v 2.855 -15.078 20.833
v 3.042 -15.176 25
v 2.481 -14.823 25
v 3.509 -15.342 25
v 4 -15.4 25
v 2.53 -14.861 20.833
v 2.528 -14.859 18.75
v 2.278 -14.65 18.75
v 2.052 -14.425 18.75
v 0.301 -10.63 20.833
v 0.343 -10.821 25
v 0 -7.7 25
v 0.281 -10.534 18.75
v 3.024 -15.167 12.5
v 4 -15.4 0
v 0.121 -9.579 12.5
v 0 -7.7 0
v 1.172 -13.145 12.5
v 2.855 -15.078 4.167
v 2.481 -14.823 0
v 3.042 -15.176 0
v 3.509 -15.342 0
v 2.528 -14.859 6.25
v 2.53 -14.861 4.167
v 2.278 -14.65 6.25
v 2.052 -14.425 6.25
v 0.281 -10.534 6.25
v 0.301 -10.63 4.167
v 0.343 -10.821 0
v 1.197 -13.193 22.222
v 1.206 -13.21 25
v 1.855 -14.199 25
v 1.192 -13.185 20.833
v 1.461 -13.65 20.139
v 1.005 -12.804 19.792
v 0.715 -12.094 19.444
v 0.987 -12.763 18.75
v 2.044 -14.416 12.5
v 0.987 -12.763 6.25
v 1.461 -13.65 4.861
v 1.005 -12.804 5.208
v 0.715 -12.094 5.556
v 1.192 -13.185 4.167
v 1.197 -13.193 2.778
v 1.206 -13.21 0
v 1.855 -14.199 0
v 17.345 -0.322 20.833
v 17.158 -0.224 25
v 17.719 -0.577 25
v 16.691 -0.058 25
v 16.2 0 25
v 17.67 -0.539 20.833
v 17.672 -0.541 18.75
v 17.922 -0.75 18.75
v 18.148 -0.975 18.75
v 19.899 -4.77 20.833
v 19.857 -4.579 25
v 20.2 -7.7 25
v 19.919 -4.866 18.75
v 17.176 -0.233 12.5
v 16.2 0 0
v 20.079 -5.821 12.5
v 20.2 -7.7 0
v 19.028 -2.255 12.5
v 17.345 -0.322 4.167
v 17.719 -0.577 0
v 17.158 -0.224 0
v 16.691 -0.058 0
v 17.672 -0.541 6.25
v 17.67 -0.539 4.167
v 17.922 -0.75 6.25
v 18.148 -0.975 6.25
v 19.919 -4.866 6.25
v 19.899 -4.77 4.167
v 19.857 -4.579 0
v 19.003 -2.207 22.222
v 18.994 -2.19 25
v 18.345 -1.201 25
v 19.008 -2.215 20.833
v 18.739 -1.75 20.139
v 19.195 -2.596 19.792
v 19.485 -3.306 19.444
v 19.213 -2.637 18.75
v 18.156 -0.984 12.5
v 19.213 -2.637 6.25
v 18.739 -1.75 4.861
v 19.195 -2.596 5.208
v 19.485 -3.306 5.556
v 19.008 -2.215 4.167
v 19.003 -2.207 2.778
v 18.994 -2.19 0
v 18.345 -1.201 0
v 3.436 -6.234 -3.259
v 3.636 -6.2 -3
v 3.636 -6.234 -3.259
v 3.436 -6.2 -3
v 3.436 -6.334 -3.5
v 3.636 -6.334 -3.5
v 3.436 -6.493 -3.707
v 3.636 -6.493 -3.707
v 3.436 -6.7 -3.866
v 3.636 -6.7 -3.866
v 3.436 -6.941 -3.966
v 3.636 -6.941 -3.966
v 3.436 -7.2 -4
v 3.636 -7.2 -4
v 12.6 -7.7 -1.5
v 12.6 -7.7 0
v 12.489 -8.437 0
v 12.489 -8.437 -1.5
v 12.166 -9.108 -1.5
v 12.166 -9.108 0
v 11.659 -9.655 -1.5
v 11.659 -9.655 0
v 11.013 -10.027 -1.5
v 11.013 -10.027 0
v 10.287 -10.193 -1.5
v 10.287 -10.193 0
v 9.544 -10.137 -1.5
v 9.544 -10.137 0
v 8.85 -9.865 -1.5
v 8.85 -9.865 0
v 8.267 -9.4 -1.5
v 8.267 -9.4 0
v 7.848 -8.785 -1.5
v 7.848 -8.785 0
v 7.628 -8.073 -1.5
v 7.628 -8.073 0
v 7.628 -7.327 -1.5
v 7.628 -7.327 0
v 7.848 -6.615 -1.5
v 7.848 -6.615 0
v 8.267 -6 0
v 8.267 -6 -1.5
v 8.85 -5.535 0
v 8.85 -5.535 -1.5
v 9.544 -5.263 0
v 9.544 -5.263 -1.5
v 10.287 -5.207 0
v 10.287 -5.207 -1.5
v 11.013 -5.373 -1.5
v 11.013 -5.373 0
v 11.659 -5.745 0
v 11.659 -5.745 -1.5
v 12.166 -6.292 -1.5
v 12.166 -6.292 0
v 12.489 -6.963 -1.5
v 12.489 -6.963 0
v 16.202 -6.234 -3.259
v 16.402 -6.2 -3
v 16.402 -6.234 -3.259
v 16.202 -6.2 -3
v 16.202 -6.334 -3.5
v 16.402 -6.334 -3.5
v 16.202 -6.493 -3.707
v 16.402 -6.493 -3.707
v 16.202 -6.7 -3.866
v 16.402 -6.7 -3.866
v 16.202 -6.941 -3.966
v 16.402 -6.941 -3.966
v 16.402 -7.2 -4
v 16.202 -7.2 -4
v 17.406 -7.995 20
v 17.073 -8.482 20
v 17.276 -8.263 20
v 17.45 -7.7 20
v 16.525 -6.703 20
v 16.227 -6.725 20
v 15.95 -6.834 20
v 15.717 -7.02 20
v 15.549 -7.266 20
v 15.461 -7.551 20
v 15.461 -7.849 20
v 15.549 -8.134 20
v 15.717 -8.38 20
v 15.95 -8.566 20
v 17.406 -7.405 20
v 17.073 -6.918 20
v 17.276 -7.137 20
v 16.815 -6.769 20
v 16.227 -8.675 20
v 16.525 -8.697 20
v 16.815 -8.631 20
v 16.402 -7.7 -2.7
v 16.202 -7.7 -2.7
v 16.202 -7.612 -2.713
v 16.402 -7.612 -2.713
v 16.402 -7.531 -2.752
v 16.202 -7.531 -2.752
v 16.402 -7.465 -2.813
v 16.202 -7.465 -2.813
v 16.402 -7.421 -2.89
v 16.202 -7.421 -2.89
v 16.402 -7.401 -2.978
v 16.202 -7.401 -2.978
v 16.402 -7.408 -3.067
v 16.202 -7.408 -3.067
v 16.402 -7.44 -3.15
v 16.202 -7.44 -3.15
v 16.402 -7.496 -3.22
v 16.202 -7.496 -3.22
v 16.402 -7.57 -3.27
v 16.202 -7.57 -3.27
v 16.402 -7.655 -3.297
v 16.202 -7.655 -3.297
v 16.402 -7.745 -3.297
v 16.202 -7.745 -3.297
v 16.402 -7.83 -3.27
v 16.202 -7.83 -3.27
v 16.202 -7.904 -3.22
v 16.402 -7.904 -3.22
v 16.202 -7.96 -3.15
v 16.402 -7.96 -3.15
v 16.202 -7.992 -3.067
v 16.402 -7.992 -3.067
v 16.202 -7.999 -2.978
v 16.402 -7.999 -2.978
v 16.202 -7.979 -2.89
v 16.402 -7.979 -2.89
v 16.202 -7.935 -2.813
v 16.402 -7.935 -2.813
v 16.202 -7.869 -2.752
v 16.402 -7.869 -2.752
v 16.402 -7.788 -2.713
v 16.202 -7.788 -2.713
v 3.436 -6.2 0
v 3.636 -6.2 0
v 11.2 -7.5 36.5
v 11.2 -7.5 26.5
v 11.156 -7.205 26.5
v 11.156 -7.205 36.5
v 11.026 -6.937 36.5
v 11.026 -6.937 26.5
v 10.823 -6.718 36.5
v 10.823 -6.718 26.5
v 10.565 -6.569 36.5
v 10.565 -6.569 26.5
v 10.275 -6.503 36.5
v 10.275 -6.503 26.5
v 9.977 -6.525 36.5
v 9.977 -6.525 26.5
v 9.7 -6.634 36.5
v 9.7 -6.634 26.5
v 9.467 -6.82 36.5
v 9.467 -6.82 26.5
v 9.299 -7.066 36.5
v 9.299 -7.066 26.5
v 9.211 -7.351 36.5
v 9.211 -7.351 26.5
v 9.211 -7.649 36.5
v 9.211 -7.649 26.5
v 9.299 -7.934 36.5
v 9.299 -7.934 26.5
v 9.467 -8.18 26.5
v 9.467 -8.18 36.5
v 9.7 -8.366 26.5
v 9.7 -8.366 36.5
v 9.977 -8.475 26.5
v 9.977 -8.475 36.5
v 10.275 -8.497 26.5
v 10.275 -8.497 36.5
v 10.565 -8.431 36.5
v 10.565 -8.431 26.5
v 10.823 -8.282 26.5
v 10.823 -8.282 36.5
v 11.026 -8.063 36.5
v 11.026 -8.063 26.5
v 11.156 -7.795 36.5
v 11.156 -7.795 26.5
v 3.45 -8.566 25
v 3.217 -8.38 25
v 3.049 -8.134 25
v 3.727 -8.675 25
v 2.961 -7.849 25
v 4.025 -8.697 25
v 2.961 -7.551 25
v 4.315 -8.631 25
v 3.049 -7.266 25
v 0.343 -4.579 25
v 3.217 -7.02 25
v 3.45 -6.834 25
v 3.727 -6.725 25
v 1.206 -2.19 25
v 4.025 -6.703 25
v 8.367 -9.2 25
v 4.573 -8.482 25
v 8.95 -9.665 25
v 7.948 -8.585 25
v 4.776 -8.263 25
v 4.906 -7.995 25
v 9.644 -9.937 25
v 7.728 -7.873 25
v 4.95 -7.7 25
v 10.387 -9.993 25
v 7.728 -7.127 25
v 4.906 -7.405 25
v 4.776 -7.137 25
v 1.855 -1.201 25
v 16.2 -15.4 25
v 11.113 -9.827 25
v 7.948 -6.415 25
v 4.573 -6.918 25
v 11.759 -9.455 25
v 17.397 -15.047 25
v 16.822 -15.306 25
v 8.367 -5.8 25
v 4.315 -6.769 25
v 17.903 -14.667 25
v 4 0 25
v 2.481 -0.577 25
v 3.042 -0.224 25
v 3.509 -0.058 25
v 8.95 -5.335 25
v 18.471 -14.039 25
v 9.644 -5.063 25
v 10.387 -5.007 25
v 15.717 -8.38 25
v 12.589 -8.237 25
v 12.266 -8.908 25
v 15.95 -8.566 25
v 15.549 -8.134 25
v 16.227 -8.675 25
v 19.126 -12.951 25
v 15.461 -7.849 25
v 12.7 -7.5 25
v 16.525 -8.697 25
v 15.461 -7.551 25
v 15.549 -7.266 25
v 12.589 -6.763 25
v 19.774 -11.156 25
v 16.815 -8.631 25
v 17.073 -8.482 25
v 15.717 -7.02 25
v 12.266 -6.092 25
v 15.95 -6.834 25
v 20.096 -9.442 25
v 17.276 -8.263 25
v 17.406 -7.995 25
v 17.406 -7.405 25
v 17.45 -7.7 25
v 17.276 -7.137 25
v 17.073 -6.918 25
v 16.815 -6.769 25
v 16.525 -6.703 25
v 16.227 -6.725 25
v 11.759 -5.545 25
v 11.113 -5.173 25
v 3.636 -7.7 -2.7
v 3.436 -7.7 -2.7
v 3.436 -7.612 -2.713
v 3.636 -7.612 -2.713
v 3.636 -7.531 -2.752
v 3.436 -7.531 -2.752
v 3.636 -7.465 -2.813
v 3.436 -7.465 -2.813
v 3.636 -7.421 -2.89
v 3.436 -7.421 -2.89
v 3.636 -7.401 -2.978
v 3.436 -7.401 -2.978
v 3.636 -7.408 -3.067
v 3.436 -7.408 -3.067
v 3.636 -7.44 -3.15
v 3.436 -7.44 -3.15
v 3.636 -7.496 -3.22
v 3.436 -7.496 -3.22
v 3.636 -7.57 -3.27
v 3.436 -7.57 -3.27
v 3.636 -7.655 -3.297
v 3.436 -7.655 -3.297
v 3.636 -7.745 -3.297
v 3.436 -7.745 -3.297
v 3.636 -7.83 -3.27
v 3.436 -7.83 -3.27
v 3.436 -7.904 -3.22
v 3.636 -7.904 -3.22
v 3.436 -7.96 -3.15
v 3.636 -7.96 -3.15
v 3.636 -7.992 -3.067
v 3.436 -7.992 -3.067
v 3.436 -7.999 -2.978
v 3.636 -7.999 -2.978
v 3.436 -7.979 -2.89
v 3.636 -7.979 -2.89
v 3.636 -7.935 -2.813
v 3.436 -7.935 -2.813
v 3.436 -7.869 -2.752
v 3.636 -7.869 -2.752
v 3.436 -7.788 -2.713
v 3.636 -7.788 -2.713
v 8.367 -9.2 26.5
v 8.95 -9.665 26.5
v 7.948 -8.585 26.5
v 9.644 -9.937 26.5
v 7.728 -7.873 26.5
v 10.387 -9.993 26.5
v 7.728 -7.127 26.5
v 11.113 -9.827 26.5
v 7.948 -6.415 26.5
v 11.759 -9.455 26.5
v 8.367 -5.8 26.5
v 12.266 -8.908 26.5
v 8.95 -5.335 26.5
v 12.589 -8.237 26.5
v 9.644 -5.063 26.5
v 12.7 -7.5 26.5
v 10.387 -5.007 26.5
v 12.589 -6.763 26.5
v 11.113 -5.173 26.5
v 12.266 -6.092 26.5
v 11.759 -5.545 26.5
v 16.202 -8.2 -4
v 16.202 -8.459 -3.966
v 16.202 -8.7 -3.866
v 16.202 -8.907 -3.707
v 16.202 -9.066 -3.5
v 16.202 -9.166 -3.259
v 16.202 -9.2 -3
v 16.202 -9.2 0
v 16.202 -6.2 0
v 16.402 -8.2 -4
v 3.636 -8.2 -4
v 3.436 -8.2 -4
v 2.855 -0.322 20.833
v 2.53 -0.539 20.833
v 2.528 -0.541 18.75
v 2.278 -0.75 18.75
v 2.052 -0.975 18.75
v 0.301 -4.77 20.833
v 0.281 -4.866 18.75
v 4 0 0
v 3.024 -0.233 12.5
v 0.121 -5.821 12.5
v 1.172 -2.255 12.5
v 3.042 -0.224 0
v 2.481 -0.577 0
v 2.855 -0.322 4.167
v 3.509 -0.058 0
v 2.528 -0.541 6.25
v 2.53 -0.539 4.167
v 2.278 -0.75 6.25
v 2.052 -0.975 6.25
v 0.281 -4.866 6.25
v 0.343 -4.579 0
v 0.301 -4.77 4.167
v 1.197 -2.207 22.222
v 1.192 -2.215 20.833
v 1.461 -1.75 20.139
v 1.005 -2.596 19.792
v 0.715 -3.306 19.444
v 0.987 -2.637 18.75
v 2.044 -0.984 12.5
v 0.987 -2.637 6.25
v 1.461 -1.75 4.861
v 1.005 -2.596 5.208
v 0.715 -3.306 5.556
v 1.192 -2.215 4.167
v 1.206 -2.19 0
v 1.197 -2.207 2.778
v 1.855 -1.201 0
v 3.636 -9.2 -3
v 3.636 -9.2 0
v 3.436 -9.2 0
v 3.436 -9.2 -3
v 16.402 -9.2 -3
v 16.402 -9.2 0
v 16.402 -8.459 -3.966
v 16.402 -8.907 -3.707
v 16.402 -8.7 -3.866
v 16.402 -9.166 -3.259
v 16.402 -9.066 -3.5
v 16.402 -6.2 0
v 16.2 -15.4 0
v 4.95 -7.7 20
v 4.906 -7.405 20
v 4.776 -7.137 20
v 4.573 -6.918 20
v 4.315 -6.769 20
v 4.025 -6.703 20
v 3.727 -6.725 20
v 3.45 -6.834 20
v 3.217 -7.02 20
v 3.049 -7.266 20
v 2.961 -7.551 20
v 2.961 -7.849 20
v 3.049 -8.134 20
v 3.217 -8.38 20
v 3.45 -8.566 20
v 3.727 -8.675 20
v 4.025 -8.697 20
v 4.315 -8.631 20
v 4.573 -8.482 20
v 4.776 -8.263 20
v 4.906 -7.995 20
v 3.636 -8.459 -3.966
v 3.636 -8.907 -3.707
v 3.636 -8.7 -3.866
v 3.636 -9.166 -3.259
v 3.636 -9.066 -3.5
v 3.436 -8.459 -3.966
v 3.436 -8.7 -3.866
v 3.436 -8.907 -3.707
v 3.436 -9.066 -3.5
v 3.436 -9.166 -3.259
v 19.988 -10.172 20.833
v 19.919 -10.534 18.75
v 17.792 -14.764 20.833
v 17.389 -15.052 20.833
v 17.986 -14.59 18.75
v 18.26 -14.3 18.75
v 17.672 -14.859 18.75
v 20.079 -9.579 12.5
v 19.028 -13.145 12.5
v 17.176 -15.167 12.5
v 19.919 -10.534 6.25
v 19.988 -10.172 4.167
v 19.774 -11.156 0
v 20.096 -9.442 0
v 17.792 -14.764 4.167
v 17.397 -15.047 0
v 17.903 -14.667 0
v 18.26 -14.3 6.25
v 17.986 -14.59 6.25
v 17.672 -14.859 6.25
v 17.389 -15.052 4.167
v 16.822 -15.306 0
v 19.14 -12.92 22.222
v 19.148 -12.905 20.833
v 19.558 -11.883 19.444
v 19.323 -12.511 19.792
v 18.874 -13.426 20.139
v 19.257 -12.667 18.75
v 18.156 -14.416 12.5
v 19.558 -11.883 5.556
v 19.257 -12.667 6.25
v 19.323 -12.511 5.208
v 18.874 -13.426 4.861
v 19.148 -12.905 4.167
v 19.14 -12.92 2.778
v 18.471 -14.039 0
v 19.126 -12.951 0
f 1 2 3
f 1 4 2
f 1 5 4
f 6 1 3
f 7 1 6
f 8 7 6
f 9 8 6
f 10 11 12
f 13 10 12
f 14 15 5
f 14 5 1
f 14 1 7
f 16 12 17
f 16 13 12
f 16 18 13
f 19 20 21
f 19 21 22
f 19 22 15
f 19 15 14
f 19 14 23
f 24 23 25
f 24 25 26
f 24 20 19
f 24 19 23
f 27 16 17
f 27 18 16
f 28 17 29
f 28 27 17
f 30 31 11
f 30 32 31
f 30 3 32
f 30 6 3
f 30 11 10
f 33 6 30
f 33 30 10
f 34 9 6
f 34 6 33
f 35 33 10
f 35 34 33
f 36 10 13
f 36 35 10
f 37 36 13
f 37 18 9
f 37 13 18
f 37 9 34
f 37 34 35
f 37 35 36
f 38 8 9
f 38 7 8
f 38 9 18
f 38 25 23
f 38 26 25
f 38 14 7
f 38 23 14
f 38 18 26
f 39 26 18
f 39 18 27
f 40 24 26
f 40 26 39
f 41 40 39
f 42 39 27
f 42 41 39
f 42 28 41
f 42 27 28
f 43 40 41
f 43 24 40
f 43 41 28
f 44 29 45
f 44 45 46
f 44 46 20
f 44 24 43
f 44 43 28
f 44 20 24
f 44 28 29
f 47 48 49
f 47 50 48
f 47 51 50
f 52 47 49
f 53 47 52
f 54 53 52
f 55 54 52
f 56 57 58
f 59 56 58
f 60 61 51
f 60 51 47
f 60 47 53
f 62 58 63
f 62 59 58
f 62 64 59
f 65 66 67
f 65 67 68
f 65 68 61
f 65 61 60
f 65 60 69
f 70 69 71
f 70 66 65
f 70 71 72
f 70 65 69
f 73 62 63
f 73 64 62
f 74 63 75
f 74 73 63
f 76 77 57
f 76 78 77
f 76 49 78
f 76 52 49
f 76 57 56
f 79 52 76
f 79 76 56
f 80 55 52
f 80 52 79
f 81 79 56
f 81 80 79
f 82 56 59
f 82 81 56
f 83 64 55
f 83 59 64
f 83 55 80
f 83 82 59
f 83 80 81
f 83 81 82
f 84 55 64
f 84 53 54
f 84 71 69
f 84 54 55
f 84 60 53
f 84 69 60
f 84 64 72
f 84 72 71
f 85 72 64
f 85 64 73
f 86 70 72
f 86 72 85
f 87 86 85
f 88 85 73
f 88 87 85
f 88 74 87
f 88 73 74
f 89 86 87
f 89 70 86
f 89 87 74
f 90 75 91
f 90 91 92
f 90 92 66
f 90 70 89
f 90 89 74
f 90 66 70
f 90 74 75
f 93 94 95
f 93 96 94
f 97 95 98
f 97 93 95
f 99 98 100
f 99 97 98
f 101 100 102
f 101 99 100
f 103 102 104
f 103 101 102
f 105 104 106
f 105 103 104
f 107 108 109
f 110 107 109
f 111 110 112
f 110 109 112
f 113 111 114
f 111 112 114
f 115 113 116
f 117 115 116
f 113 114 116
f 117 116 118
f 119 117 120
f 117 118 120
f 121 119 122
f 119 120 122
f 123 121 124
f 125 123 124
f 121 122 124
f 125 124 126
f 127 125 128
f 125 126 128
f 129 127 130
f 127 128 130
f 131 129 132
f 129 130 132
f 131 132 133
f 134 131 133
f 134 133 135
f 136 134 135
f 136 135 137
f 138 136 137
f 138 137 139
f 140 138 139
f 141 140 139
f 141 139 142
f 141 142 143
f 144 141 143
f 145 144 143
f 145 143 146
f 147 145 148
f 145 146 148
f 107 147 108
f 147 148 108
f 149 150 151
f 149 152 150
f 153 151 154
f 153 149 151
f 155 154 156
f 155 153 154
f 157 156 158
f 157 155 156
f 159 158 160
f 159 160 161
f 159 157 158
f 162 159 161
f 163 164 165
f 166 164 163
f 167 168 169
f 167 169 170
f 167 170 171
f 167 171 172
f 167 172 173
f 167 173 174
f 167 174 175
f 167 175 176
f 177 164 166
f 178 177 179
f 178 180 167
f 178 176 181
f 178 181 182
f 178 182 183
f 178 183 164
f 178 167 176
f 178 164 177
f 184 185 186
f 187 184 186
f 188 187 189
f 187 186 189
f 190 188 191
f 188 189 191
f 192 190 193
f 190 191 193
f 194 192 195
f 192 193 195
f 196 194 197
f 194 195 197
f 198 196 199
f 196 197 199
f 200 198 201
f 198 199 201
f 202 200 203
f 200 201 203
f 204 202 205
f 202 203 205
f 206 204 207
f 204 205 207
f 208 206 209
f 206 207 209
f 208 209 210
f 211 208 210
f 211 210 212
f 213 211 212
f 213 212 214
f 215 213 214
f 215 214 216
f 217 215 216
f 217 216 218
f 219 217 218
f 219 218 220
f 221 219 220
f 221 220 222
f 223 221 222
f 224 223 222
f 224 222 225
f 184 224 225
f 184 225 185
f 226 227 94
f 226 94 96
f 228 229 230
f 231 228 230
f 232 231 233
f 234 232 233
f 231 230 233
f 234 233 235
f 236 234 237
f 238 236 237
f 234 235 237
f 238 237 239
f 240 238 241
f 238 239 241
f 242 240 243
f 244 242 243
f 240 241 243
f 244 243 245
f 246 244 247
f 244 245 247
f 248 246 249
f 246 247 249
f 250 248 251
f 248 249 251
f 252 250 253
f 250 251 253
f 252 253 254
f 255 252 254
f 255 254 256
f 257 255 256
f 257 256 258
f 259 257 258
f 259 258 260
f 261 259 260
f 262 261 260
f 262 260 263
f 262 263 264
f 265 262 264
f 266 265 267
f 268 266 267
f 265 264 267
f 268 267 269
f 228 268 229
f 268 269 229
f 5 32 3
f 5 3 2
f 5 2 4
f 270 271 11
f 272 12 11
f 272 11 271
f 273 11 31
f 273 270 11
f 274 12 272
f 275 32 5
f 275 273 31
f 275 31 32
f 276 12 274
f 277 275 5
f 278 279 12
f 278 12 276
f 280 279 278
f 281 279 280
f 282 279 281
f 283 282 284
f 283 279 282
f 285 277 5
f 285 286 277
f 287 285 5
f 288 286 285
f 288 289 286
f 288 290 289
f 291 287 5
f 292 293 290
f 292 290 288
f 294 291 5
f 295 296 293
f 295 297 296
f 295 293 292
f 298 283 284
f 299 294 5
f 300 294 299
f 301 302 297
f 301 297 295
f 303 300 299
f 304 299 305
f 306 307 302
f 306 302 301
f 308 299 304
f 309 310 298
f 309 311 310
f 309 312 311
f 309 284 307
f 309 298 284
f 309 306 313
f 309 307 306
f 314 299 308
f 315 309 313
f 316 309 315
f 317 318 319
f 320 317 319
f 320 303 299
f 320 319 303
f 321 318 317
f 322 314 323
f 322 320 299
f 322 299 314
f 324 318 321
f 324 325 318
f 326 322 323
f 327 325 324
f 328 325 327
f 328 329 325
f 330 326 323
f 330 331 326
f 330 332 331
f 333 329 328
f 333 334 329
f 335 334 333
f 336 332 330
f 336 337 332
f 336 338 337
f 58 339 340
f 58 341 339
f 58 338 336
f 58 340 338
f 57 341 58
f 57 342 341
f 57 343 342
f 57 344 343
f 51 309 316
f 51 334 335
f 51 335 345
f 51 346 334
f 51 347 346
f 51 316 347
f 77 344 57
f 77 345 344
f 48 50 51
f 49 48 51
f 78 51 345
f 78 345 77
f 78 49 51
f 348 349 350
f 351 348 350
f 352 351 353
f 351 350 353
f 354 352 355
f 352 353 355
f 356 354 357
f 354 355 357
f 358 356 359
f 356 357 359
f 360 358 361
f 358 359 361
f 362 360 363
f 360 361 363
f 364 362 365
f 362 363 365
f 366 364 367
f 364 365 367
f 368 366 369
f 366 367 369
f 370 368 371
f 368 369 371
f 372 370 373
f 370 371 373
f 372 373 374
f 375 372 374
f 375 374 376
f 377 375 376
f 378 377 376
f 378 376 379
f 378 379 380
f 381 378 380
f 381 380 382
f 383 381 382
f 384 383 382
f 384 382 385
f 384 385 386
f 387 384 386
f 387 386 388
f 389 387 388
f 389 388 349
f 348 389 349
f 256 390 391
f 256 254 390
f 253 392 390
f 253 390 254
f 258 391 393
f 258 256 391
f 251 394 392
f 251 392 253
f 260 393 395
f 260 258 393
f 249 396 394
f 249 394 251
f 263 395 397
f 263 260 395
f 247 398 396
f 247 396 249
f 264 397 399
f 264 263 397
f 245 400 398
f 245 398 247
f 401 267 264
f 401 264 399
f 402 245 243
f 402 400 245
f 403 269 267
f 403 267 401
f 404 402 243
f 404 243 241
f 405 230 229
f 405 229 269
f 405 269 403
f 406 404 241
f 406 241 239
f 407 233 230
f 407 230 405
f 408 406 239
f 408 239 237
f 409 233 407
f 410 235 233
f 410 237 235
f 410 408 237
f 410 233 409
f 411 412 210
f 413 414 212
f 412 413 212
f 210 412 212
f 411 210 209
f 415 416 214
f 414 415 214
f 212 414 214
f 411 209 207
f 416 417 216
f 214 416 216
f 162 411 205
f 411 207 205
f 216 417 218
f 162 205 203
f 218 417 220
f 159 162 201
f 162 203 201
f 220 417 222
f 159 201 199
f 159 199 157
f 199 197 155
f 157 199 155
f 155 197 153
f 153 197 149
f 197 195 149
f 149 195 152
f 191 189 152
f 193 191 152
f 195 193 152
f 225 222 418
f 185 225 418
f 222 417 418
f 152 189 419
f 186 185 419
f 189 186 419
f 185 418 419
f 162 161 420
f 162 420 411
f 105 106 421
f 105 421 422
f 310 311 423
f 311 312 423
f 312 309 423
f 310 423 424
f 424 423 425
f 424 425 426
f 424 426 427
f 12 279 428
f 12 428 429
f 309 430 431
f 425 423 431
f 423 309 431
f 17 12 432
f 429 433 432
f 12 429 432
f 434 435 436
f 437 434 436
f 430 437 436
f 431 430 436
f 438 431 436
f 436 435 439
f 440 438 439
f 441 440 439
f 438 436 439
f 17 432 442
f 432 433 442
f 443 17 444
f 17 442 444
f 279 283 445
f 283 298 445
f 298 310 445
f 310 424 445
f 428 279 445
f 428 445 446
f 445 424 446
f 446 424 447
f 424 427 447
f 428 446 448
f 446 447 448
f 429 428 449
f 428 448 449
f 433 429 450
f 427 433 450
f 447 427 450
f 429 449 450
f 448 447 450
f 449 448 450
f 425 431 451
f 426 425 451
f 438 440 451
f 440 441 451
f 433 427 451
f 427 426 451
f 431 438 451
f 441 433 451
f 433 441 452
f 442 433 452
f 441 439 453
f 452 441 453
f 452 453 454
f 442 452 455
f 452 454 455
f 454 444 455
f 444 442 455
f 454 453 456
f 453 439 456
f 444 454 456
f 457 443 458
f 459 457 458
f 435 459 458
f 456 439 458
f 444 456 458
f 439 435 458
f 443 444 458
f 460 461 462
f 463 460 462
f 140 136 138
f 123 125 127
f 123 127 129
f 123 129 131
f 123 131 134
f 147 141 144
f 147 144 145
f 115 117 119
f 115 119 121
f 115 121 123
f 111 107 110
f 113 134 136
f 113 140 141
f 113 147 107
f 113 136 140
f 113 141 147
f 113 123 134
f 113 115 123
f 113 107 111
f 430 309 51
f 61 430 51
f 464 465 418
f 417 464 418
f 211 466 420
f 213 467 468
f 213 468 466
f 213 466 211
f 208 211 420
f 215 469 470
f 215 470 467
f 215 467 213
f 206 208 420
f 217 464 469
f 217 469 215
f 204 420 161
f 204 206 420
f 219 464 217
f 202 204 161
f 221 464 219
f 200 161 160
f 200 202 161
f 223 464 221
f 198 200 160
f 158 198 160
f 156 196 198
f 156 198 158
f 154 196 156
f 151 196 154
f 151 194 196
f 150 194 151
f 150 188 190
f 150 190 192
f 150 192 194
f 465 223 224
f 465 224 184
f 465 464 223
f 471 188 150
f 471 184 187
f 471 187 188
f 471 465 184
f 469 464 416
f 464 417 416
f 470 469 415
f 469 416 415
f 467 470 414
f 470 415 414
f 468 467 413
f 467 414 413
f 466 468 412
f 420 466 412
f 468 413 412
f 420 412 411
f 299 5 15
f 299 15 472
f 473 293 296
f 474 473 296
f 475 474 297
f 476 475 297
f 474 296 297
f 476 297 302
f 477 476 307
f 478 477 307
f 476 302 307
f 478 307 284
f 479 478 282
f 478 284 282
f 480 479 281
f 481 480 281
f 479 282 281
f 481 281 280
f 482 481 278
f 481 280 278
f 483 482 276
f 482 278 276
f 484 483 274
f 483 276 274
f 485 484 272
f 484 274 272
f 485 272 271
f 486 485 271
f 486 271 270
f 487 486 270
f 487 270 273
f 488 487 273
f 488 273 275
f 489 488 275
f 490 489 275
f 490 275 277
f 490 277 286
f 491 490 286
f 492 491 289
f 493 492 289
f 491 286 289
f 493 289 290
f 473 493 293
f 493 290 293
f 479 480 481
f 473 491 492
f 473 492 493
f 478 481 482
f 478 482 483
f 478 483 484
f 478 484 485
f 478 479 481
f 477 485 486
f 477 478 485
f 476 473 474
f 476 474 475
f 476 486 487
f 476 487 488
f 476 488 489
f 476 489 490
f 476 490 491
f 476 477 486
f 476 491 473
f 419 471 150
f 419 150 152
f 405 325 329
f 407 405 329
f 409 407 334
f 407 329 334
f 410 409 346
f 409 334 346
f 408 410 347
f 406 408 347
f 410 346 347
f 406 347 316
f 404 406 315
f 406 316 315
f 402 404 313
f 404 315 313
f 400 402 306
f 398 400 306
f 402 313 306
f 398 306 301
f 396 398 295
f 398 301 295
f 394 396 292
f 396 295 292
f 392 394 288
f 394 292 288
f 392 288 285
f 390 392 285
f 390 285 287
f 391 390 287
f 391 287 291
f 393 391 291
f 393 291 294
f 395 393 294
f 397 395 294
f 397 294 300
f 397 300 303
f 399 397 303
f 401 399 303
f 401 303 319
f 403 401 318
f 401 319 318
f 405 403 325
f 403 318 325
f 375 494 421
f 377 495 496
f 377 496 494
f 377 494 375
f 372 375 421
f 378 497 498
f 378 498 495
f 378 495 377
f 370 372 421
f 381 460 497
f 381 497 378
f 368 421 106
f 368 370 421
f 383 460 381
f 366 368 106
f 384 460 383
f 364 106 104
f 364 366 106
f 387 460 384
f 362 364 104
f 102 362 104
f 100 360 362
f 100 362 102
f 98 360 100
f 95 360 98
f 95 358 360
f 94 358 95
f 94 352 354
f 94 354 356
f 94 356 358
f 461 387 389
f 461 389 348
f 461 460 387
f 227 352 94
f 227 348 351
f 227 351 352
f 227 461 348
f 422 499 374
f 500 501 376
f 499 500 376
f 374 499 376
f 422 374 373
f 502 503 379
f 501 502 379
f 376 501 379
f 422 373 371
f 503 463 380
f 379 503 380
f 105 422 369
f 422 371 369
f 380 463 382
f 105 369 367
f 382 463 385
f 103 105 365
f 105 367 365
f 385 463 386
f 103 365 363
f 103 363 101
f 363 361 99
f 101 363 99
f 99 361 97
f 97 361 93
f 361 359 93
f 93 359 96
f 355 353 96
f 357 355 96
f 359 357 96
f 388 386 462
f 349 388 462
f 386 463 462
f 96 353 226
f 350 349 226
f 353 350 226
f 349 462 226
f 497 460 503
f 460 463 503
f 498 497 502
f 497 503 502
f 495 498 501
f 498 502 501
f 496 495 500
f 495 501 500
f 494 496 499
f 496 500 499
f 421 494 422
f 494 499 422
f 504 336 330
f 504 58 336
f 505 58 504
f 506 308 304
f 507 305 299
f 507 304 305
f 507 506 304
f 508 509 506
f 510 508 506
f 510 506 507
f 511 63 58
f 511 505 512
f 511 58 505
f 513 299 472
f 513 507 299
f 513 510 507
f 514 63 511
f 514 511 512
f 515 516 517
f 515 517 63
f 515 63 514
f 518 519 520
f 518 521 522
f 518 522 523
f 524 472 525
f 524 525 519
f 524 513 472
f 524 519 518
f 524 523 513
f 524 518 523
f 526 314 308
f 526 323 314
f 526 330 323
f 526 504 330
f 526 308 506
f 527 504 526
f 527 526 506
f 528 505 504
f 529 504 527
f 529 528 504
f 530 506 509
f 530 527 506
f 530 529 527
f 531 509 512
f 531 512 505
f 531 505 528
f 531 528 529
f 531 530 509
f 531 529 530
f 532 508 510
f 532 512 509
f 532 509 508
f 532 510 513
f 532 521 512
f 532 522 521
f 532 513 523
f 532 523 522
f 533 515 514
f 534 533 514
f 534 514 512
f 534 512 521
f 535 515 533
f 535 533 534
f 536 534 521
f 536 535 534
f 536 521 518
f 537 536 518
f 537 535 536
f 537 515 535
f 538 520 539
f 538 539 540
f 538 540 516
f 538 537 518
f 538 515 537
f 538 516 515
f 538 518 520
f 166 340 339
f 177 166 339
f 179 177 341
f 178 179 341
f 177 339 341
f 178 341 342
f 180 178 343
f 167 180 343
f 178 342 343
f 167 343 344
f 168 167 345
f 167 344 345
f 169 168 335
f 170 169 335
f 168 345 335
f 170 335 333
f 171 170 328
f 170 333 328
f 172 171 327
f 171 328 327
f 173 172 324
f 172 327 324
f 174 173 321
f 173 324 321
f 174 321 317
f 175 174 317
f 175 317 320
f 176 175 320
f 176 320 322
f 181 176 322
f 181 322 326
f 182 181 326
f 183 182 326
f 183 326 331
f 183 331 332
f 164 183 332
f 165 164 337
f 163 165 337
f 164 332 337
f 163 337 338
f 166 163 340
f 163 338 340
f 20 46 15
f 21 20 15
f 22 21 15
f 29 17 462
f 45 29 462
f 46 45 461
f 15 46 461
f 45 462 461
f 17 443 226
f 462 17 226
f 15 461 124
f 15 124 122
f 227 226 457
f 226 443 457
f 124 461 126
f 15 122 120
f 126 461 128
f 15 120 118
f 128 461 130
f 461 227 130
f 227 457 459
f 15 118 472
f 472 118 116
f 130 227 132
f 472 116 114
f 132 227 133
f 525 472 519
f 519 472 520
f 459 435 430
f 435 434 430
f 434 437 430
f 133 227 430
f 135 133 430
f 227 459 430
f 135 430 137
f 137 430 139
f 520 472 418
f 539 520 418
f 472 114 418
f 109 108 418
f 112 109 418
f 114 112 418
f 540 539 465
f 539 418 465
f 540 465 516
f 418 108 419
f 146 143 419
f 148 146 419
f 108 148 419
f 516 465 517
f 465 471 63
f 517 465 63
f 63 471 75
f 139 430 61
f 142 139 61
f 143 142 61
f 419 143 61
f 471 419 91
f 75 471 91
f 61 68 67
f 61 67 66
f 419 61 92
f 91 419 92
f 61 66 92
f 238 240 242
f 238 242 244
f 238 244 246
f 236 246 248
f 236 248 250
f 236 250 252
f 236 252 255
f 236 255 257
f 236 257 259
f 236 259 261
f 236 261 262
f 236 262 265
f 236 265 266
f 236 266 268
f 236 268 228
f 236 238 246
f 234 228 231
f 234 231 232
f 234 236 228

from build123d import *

# Parameters (mm, degrees)
SKETCH_1_W          = 20.2
SKETCH_1_H          = 15.4
EXTRUDE_1_DEPTH     = 25
SKETCH_2_R          = 2.5
EXTRUDE_2_DEPTH     = 1.5
SKETCH_3_R          = 1
EXTRUDE_3_DEPTH     = 10
FILLET_2_SIZE       = 7.7
FILLET_2_SIZE_2     = 4
FILLET_3_SIZE       = 4
FILLET_3_SIZE_2     = 7.7
SKETCH_4_R          = 1
CUT_EXTRUDE_1_DEPTH = 5
SKETCH_5_R          = 2.5
EXTRUDE_4_DEPTH     = 1.5
SKETCH_6_W          = 0.2
SKETCH_6_H          = 3
EXTRUDE_5_DEPTH     = 4
FILLET_4_R          = 1
SKETCH_7_R          = 0.3
CUT_EXTRUDE_2_DEPTH = 44.016597153


with BuildPart() as part:
    # 草图1 → 凸台-拉伸1 (new body)
    with BuildSketch(Plane.XY):
        with Locations((10.1, -7.7)):
            Rectangle(SKETCH_1_W, SKETCH_1_H)
    extrude(amount=EXTRUDE_1_DEPTH)

    # 草图2 → 凸台-拉伸2 (add)
    with BuildSketch(Plane.XY.offset(25)):
        with Locations((10.2, -7.5)):
            Circle(SKETCH_2_R)
    extrude(amount=EXTRUDE_2_DEPTH)

    # 草图3 → 凸台-拉伸3 (add)
    with BuildSketch(Plane.XY.offset(26.5)):
        with Locations((10.2, -7.5)):
            Circle(SKETCH_3_R)
    extrude(amount=EXTRUDE_3_DEPTH)

    # 圆角2
    # an asymmetric fillet: 7.7, 4 mm, written as the material it takes off along each edge
    with BuildSketch(Plane(origin=(20.2, -15.4, -19.25), x_dir=(0, 1, 0), z_dir=(0, 0, 1))) as fillet_2_piece_1:
        with BuildLine():
            Bezier((FILLET_2_SIZE, 0), (0, 0), (0, FILLET_2_SIZE_2), weights=[1, 0.707106781, 1])
            Line((0, FILLET_2_SIZE_2), (0, 0))
            Line((0, 0), (FILLET_2_SIZE, 0))
        make_face()
    extrude(amount=63.5, mode=Mode.SUBTRACT)
    with BuildSketch(Plane(origin=(0, 0, -19.25), x_dir=(1, 0, 0), z_dir=(0, 0, 1))) as fillet_2_piece_2:
        with BuildLine():
            Bezier((FILLET_2_SIZE_2, 0), (0, 0), (0, -FILLET_2_SIZE), weights=[1, 0.707106781, 1])
            Line((0, -FILLET_2_SIZE), (0, 0))
            Line((0, 0), (FILLET_2_SIZE_2, 0))
        make_face()
    extrude(amount=63.5, mode=Mode.SUBTRACT)

    # 圆角3
    # an asymmetric fillet: 7.7, 4 mm, written as the material it takes off along each edge
    with BuildSketch(Plane(origin=(20.2, 0, -19.25), x_dir=(-1, 0, 0), z_dir=(0, 0, 1)), Plane(origin=(0, -15.4, -19.25), x_dir=(1, 0, 0), z_dir=(0, 0, 1))) as fillet_3_piece_1:
        with BuildLine():
            Bezier((FILLET_3_SIZE, 0), (0, 0), (0, FILLET_3_SIZE_2), weights=[1, 0.707106781, 1])
            Line((0, FILLET_3_SIZE_2), (0, 0))
            Line((0, 0), (FILLET_3_SIZE, 0))
        make_face()
    extrude(amount=63.5, mode=Mode.SUBTRACT)

    # 草图4 → 切除-拉伸1 (cut)
    with BuildSketch(Plane.XY.offset(25)):
        with Locations((3.95, -7.7)):
            Circle(SKETCH_4_R)
        with Locations((16.45, -7.7)):
            Circle(SKETCH_4_R)
    extrude(amount=-CUT_EXTRUDE_1_DEPTH, mode=Mode.SUBTRACT)

    # 草图5 → 凸台-拉伸4 (add)
    with BuildSketch(Plane(origin=(0, 0, 0), x_dir=(-1, 0, 0), z_dir=(0, 0, -1))):
        with Locations(Location((-10.1, -7.7, 0), (0, 0, 180))):
            Circle(SKETCH_5_R)
    extrude(amount=EXTRUDE_4_DEPTH)

    # 草图6 → 凸台-拉伸5 (add)
    with BuildSketch(Plane(origin=(0, 0, 0), x_dir=(-1, 0, 0), z_dir=(0, 0, -1))):
        with Locations((-3.536419709, -7.7)):
            Rectangle(SKETCH_6_W, SKETCH_6_H)
        with Locations((-16.302368295, -7.7)):
            Rectangle(SKETCH_6_W, SKETCH_6_H)
    extrude(amount=EXTRUDE_5_DEPTH)

    # 圆角4
    fillet_4_edges = [part.edges().sort_by_distance(p)[0] for p in [
        (3.536419709, -6.2, -4),
        (3.536419709, -9.2, -4),
        (16.302368295, -6.2, -4),
        (16.302368295, -9.2, -4),
    ]]
    fillet(fillet_4_edges, radius=FILLET_4_R)

    # 草图7 → 切除-拉伸2 (cut, through all)
    with BuildSketch(Plane.ZY.offset(-3.436419709)):
        with Locations((-3, -7.7)):
            Circle(SKETCH_7_R)
    extrude(amount=-CUT_EXTRUDE_2_DEPTH, mode=Mode.SUBTRACT)


solid = part.part
